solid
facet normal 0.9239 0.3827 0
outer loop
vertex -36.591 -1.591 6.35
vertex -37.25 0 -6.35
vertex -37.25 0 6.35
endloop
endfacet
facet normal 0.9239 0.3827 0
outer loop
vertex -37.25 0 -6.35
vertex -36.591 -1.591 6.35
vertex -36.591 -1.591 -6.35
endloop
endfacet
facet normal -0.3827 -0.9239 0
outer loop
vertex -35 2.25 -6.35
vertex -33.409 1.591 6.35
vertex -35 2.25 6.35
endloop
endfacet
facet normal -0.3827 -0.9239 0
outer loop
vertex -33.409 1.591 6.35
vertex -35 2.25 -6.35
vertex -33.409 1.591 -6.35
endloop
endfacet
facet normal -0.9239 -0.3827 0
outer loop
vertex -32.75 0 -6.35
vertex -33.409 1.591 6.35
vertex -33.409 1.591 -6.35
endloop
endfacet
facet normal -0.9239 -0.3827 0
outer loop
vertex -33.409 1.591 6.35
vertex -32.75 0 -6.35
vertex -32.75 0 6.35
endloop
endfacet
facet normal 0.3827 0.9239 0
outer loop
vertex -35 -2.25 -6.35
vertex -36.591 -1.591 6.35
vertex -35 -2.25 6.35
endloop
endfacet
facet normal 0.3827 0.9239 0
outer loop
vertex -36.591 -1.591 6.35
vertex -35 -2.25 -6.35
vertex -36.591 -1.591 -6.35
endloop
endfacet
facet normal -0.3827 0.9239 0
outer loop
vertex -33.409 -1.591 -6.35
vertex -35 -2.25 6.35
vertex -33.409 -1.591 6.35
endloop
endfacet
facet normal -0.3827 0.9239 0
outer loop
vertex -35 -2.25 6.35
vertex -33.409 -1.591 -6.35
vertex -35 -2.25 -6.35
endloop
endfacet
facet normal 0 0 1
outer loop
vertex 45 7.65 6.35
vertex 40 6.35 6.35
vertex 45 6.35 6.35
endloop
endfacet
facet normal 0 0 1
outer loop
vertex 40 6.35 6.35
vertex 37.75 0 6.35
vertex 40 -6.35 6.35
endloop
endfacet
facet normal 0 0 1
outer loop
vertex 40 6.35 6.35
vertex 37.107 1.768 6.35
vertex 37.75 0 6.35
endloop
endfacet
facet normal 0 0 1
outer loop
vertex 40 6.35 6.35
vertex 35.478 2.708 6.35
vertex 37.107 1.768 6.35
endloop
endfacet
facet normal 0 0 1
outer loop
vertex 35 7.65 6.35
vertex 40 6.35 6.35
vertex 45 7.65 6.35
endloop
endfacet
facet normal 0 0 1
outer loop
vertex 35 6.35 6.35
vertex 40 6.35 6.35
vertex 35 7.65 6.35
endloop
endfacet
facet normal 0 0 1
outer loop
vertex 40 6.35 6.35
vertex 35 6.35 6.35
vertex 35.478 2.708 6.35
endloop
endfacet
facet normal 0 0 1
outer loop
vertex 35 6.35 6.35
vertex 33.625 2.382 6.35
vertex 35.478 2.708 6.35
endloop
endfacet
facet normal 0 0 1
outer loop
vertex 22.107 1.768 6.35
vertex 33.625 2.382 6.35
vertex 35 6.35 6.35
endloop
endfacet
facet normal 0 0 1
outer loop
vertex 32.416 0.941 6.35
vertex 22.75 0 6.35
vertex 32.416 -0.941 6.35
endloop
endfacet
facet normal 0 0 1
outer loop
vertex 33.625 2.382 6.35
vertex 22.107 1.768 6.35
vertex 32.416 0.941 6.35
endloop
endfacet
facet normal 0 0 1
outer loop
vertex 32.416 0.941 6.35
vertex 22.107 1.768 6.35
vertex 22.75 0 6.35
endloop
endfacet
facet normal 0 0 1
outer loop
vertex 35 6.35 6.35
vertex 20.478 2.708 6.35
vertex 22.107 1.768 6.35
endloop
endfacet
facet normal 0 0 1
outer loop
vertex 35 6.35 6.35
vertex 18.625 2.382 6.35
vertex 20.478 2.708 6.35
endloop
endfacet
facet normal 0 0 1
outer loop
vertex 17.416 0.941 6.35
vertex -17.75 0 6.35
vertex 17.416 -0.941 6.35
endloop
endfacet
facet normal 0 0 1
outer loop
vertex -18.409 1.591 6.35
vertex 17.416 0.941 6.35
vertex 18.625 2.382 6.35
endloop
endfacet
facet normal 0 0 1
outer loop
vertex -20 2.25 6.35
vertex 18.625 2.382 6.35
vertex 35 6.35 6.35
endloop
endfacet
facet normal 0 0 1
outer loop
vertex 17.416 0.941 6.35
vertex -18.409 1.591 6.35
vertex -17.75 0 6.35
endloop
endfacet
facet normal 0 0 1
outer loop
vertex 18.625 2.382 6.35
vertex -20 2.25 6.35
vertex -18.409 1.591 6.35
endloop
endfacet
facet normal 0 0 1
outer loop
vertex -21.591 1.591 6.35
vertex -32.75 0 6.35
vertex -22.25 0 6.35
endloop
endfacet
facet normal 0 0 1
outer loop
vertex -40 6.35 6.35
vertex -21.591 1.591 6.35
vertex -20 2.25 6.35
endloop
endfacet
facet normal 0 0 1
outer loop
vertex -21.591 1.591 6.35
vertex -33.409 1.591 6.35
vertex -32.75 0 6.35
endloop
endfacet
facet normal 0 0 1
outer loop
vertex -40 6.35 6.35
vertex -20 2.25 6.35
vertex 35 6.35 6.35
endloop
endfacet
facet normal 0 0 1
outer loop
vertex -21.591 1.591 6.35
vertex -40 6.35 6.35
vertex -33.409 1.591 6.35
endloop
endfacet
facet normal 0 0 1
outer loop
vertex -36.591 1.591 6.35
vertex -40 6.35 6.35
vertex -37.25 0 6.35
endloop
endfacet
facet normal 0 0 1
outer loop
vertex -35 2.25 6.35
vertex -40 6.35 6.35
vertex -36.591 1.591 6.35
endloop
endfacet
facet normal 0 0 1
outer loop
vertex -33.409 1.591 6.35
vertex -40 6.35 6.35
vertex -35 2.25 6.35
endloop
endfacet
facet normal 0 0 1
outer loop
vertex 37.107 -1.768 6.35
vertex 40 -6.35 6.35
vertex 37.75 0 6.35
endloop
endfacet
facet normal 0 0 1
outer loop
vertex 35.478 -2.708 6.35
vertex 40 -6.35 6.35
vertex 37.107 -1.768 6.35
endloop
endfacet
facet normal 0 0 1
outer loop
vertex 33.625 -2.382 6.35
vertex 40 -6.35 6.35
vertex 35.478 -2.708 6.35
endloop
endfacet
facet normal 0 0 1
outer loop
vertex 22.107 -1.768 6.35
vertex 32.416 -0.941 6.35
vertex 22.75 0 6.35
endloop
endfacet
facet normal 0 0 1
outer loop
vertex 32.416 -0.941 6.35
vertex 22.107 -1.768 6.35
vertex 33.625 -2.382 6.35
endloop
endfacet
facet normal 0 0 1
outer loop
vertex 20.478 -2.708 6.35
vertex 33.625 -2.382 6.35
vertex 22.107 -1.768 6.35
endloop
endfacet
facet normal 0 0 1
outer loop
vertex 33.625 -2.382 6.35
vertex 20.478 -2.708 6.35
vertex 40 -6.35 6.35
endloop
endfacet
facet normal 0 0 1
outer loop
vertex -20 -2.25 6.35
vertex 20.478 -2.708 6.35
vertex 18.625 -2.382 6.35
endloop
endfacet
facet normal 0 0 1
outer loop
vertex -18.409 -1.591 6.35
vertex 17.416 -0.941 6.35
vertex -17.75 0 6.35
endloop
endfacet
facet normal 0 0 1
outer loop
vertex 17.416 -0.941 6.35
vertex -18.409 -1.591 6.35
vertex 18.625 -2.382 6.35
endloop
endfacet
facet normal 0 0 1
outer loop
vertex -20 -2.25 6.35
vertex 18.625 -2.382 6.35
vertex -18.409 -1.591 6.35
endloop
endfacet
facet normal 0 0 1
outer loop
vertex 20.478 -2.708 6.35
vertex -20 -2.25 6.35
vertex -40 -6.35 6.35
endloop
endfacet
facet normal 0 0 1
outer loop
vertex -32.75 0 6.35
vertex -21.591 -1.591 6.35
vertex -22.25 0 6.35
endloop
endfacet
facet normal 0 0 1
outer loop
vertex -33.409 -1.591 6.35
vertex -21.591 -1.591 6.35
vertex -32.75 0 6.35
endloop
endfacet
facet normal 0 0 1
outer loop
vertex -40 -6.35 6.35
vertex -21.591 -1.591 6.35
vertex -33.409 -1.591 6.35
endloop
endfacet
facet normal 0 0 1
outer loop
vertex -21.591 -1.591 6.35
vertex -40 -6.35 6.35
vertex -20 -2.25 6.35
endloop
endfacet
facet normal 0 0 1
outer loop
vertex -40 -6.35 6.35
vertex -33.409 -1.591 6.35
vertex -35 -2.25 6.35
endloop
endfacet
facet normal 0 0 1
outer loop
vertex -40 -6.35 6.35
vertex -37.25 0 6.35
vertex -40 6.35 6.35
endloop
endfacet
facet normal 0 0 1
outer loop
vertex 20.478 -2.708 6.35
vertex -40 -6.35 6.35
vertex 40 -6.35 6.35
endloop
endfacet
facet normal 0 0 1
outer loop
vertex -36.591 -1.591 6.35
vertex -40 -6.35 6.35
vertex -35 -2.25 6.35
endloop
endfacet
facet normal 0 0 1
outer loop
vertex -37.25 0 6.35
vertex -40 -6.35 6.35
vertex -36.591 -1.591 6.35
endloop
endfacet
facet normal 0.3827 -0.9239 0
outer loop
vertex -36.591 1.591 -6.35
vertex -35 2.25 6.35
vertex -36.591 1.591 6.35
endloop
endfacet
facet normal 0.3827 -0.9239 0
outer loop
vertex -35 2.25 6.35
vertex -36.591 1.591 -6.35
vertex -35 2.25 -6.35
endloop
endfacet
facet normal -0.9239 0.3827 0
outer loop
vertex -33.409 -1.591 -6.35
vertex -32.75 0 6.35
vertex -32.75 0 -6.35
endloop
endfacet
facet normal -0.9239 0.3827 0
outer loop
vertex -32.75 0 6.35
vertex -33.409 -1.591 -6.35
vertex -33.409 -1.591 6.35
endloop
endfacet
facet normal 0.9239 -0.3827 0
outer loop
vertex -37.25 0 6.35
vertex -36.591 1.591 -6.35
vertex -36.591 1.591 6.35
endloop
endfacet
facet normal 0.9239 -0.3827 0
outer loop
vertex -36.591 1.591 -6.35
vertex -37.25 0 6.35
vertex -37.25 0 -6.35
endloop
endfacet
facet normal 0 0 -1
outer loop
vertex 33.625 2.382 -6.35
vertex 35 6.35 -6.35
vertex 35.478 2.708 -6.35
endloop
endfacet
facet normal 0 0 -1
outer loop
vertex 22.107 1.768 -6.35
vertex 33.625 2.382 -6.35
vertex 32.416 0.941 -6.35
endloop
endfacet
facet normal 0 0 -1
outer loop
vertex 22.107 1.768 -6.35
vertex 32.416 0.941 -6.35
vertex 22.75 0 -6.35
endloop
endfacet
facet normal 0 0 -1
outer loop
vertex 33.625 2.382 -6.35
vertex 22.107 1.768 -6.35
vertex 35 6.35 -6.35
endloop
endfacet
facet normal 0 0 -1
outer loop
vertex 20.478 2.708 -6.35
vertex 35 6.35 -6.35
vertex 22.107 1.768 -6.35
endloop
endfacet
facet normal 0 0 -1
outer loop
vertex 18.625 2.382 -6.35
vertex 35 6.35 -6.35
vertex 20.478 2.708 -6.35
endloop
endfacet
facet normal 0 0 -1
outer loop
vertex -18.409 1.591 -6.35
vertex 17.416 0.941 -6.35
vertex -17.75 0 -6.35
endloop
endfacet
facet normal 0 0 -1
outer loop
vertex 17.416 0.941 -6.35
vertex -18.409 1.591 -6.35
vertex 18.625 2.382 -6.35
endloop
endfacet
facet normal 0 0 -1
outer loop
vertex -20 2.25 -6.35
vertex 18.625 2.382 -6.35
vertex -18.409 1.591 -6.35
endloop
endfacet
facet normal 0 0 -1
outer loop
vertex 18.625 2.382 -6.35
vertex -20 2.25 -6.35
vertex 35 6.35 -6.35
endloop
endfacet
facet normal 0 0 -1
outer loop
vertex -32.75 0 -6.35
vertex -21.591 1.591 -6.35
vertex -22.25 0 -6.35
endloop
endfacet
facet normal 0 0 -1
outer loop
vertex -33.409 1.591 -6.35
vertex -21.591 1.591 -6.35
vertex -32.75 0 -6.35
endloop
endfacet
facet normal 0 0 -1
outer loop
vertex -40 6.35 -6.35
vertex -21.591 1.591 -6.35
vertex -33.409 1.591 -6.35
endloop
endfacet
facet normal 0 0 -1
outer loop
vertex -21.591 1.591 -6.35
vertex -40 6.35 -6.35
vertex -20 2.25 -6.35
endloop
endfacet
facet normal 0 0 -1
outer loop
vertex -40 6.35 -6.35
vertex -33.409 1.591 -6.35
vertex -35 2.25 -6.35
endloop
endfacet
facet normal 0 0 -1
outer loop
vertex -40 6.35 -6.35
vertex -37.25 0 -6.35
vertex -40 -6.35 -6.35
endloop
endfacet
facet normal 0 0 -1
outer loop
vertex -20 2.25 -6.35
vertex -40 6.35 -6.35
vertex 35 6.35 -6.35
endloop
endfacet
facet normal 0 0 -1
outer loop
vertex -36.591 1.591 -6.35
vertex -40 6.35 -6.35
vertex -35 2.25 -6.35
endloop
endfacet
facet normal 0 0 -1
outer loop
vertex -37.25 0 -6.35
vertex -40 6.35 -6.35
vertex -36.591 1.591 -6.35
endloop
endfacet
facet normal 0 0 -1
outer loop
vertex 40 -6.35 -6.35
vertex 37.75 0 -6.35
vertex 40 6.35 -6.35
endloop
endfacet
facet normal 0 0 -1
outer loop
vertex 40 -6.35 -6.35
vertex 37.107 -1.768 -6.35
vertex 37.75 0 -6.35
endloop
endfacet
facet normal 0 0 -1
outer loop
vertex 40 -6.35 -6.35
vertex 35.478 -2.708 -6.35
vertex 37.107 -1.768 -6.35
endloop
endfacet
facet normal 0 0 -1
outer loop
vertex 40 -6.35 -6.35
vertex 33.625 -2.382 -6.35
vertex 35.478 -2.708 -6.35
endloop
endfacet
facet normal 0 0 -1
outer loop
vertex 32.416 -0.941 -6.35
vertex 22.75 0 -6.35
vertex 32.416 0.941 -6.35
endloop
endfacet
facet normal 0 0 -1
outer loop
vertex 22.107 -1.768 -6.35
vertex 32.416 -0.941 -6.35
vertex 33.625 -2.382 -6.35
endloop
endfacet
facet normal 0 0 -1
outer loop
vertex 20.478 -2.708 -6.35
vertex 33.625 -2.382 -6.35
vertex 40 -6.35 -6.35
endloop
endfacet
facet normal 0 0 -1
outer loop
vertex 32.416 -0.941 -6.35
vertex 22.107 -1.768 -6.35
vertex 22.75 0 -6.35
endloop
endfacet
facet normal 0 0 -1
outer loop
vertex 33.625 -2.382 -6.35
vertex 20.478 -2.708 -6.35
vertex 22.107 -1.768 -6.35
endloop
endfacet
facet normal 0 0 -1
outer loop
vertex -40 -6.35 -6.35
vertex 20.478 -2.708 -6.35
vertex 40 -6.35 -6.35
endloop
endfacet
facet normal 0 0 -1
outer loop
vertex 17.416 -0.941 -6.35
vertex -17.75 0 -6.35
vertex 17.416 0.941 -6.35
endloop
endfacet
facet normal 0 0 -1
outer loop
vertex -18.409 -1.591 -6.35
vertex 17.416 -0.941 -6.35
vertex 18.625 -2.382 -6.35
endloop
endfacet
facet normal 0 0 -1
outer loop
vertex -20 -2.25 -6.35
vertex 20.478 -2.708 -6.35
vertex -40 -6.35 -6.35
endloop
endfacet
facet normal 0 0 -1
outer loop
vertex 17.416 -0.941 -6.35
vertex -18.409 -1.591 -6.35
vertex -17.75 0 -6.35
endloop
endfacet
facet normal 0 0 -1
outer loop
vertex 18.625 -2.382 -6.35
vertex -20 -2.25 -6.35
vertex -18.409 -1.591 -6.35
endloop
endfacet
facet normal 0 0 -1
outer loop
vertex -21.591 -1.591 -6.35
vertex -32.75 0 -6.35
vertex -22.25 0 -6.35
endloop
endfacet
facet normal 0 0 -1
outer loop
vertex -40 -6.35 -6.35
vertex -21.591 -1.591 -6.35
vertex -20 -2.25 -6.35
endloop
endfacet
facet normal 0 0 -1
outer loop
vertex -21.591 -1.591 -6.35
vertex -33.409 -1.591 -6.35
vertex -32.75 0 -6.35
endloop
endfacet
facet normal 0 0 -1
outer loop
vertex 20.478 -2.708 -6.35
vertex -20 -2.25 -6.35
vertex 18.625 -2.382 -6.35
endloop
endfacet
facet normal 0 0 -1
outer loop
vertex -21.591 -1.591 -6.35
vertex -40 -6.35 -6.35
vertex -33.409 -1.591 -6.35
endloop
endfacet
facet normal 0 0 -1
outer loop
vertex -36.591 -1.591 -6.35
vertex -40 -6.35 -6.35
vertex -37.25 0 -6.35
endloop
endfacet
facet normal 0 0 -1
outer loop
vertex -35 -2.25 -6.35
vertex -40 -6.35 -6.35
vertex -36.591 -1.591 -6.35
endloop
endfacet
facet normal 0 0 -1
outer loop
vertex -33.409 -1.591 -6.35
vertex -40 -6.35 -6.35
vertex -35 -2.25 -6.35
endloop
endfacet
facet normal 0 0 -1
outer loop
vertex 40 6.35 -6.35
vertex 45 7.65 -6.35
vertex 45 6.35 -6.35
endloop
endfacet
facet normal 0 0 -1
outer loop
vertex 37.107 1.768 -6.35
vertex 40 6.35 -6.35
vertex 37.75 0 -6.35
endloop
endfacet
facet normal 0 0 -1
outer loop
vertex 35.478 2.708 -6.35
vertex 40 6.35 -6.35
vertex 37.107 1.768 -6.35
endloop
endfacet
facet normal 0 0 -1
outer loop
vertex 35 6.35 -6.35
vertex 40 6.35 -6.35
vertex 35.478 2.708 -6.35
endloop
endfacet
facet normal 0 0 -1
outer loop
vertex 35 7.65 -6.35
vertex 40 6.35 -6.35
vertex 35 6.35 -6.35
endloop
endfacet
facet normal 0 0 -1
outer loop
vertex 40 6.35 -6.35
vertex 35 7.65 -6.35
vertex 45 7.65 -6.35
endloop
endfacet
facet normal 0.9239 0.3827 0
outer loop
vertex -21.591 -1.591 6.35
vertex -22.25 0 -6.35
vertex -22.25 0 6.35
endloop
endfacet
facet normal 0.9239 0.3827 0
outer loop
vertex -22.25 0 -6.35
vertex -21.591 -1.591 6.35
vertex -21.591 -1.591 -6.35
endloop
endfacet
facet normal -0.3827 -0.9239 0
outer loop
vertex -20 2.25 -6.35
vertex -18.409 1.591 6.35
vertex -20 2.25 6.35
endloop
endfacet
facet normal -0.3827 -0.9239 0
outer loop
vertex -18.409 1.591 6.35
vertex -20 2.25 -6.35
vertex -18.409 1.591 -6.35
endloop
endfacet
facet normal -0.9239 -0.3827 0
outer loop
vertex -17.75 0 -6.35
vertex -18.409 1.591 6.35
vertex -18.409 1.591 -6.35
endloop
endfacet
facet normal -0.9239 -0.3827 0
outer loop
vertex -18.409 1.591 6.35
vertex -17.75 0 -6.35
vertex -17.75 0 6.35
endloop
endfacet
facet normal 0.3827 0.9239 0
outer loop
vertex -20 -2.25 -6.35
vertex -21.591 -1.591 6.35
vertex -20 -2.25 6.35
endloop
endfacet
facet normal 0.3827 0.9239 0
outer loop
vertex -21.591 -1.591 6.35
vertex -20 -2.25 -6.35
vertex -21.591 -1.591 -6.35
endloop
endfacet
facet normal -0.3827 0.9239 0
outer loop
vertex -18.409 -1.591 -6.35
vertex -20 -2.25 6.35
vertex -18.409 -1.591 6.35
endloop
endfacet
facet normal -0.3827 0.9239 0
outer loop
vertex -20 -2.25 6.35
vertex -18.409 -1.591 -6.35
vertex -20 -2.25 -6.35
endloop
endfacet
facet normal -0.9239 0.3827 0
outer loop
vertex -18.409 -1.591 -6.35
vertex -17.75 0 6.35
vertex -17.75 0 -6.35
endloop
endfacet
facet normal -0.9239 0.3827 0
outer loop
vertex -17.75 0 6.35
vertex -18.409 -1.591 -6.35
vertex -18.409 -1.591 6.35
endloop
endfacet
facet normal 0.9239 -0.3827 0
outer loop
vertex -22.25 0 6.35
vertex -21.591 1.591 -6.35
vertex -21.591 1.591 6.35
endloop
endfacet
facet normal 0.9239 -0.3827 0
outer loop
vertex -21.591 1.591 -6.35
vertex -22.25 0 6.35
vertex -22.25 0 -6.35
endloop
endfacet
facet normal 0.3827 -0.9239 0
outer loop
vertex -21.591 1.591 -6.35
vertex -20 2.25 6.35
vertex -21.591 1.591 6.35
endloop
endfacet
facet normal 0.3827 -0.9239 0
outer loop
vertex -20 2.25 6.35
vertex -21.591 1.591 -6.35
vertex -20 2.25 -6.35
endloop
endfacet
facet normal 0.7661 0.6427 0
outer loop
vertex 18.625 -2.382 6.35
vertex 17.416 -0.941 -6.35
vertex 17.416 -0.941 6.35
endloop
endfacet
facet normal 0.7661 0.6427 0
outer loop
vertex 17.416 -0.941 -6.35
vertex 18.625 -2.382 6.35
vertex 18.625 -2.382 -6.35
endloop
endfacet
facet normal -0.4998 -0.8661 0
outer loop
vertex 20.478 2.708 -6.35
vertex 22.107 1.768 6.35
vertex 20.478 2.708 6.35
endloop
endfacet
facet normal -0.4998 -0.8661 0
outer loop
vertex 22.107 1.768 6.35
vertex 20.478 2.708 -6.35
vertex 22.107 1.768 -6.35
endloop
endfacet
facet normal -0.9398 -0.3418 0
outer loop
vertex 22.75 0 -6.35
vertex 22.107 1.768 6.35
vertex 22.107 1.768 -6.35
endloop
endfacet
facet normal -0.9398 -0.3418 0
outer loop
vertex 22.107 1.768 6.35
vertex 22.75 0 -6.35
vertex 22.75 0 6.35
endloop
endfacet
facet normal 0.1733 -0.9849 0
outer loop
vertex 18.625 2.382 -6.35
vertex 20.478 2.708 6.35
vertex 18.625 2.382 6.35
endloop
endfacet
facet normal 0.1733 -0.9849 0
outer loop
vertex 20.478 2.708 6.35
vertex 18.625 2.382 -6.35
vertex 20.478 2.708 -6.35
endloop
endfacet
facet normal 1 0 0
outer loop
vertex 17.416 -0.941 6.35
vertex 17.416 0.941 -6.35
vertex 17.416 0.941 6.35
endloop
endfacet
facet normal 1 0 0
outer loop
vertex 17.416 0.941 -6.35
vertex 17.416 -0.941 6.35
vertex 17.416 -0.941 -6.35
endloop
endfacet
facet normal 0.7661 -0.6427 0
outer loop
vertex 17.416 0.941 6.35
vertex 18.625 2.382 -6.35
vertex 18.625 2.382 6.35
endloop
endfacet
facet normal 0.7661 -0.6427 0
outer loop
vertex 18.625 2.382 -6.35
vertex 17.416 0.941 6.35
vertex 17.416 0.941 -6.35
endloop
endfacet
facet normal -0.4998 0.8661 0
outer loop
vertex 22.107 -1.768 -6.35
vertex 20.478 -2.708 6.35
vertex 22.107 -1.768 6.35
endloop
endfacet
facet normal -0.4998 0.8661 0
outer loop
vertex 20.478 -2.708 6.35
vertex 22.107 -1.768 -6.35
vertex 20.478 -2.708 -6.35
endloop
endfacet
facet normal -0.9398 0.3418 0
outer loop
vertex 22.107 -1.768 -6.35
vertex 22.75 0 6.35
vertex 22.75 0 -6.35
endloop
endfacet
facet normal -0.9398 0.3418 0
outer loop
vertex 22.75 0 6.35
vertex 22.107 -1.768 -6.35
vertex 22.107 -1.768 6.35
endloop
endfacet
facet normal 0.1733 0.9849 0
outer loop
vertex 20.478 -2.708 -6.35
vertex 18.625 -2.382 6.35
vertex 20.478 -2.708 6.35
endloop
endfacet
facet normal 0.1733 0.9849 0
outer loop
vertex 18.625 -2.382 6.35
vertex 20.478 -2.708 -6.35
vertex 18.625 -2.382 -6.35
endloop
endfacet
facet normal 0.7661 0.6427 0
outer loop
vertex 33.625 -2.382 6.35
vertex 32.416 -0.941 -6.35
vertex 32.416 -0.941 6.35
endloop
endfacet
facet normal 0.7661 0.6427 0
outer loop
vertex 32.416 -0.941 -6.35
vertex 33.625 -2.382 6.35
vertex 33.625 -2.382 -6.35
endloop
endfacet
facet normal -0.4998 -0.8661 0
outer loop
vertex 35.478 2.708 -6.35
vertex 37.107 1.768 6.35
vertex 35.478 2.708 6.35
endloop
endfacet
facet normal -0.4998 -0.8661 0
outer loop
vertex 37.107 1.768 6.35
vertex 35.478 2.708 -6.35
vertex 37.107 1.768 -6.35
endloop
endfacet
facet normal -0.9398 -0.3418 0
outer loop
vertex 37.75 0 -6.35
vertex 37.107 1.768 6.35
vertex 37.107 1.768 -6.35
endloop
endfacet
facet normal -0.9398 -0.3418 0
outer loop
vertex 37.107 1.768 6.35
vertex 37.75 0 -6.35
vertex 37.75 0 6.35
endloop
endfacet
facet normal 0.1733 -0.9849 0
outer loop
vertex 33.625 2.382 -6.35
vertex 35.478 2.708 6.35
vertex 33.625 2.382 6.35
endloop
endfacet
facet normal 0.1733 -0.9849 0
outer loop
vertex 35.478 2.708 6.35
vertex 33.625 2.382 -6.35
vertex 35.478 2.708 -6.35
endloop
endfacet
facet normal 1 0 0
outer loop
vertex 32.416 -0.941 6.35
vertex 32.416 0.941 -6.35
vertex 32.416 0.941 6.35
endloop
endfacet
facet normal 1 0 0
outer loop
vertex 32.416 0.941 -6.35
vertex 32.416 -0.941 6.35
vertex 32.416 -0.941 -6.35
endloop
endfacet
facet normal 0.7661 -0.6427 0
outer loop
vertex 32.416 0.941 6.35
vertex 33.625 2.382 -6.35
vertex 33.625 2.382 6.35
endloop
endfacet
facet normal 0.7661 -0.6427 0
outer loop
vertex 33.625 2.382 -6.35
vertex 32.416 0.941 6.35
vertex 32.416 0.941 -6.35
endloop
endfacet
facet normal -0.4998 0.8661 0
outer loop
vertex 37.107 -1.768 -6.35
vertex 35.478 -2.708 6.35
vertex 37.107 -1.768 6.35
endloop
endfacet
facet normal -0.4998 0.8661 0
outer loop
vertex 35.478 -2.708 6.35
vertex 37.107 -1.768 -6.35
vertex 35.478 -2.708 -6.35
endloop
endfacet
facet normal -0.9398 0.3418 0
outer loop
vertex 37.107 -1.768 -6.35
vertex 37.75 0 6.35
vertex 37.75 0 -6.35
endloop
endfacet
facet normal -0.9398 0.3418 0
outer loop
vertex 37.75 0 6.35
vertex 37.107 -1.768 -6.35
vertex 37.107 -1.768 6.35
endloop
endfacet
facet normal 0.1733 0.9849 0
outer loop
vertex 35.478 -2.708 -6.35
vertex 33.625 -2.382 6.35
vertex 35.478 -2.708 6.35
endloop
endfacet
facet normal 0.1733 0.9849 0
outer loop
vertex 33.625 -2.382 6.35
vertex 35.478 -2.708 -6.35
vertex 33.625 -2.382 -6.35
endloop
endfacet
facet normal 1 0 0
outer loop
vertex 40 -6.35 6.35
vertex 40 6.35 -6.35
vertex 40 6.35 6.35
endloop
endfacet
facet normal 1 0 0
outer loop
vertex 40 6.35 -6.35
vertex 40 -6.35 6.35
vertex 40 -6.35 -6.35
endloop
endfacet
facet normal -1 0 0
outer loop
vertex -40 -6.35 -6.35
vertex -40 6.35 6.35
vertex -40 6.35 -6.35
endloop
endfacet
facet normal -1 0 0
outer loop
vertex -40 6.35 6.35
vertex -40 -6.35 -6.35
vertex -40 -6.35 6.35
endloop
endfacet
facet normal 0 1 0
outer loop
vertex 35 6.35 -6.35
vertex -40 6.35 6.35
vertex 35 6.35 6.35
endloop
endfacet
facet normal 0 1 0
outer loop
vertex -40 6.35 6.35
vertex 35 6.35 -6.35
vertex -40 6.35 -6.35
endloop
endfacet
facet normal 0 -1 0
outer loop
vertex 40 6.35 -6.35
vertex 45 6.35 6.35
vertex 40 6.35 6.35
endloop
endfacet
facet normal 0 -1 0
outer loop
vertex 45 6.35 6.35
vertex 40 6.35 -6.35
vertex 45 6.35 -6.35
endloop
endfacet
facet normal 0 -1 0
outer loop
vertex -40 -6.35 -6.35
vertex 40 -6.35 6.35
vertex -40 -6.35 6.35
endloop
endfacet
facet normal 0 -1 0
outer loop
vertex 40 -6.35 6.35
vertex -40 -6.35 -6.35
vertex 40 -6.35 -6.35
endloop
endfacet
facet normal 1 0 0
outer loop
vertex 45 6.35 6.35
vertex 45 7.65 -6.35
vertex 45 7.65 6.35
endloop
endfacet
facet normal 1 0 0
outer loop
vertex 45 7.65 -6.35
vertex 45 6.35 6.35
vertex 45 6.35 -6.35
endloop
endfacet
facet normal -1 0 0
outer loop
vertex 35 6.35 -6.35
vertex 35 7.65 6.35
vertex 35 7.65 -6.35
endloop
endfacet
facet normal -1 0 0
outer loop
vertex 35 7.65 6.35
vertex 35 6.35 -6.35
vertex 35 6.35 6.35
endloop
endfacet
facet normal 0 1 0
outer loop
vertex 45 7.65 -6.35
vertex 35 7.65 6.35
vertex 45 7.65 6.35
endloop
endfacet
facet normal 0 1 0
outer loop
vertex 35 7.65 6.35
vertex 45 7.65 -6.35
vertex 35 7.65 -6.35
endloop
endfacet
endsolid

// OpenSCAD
/* TAL220 Load Cell - Basic dimensional representation of the TAL220
    Copyright (C) 2019 Benjamin Hubbard

    This program is free software: you can redistribute it and/or modify
    it under the terms of the GNU General Public License as published by
    the Free Software Foundation, either version 3 of the License, or
    (at your option) any later version.

    This program is distributed in the hope that it will be useful,
    but WITHOUT ANY WARRANTY; without even the implied warranty of
    MERCHANTABILITY or FITNESS FOR A PARTICULAR PURPOSE.  See the
    GNU General Public License for more details.

    You should have received a copy of the GNU General Public License
    along with this program.  If not, see <https://www.gnu.org/licenses/>.
 */

TAL220();

module TAL220()
{
    // Outer Dimensions (l, w, h)
    dim = [ 80, 12.7, 12.7 ];

    // Hole locations.
    holeX = [ -35, -20, 20, 35 ];
    holeY = [ 0, 0, 0, 0 ];

    // Hole diameters (M4, M4, M5, M5).
    diam = [ 4.5, 4.5, 5.5, 5.5 ];

    // Strain gage cables
    cableThickness = 1.3;

    // Make the TAL220, centroid at the origin.
    difference()
    {
        cube(dim, center = true);
        for (i = [0:3])
        {
            translate([ holeX[i], holeY[i], 0 ]) cylinder(d = diam[i], h = dim[2], center = true);
        }
    }

    // Add cable representation.
    translate([ dim[0] / 2, dim[1] / 2 + cableThickness / 2, 0 ]) cube([ 10, cableThickness, dim[2] ], center = true);
}
